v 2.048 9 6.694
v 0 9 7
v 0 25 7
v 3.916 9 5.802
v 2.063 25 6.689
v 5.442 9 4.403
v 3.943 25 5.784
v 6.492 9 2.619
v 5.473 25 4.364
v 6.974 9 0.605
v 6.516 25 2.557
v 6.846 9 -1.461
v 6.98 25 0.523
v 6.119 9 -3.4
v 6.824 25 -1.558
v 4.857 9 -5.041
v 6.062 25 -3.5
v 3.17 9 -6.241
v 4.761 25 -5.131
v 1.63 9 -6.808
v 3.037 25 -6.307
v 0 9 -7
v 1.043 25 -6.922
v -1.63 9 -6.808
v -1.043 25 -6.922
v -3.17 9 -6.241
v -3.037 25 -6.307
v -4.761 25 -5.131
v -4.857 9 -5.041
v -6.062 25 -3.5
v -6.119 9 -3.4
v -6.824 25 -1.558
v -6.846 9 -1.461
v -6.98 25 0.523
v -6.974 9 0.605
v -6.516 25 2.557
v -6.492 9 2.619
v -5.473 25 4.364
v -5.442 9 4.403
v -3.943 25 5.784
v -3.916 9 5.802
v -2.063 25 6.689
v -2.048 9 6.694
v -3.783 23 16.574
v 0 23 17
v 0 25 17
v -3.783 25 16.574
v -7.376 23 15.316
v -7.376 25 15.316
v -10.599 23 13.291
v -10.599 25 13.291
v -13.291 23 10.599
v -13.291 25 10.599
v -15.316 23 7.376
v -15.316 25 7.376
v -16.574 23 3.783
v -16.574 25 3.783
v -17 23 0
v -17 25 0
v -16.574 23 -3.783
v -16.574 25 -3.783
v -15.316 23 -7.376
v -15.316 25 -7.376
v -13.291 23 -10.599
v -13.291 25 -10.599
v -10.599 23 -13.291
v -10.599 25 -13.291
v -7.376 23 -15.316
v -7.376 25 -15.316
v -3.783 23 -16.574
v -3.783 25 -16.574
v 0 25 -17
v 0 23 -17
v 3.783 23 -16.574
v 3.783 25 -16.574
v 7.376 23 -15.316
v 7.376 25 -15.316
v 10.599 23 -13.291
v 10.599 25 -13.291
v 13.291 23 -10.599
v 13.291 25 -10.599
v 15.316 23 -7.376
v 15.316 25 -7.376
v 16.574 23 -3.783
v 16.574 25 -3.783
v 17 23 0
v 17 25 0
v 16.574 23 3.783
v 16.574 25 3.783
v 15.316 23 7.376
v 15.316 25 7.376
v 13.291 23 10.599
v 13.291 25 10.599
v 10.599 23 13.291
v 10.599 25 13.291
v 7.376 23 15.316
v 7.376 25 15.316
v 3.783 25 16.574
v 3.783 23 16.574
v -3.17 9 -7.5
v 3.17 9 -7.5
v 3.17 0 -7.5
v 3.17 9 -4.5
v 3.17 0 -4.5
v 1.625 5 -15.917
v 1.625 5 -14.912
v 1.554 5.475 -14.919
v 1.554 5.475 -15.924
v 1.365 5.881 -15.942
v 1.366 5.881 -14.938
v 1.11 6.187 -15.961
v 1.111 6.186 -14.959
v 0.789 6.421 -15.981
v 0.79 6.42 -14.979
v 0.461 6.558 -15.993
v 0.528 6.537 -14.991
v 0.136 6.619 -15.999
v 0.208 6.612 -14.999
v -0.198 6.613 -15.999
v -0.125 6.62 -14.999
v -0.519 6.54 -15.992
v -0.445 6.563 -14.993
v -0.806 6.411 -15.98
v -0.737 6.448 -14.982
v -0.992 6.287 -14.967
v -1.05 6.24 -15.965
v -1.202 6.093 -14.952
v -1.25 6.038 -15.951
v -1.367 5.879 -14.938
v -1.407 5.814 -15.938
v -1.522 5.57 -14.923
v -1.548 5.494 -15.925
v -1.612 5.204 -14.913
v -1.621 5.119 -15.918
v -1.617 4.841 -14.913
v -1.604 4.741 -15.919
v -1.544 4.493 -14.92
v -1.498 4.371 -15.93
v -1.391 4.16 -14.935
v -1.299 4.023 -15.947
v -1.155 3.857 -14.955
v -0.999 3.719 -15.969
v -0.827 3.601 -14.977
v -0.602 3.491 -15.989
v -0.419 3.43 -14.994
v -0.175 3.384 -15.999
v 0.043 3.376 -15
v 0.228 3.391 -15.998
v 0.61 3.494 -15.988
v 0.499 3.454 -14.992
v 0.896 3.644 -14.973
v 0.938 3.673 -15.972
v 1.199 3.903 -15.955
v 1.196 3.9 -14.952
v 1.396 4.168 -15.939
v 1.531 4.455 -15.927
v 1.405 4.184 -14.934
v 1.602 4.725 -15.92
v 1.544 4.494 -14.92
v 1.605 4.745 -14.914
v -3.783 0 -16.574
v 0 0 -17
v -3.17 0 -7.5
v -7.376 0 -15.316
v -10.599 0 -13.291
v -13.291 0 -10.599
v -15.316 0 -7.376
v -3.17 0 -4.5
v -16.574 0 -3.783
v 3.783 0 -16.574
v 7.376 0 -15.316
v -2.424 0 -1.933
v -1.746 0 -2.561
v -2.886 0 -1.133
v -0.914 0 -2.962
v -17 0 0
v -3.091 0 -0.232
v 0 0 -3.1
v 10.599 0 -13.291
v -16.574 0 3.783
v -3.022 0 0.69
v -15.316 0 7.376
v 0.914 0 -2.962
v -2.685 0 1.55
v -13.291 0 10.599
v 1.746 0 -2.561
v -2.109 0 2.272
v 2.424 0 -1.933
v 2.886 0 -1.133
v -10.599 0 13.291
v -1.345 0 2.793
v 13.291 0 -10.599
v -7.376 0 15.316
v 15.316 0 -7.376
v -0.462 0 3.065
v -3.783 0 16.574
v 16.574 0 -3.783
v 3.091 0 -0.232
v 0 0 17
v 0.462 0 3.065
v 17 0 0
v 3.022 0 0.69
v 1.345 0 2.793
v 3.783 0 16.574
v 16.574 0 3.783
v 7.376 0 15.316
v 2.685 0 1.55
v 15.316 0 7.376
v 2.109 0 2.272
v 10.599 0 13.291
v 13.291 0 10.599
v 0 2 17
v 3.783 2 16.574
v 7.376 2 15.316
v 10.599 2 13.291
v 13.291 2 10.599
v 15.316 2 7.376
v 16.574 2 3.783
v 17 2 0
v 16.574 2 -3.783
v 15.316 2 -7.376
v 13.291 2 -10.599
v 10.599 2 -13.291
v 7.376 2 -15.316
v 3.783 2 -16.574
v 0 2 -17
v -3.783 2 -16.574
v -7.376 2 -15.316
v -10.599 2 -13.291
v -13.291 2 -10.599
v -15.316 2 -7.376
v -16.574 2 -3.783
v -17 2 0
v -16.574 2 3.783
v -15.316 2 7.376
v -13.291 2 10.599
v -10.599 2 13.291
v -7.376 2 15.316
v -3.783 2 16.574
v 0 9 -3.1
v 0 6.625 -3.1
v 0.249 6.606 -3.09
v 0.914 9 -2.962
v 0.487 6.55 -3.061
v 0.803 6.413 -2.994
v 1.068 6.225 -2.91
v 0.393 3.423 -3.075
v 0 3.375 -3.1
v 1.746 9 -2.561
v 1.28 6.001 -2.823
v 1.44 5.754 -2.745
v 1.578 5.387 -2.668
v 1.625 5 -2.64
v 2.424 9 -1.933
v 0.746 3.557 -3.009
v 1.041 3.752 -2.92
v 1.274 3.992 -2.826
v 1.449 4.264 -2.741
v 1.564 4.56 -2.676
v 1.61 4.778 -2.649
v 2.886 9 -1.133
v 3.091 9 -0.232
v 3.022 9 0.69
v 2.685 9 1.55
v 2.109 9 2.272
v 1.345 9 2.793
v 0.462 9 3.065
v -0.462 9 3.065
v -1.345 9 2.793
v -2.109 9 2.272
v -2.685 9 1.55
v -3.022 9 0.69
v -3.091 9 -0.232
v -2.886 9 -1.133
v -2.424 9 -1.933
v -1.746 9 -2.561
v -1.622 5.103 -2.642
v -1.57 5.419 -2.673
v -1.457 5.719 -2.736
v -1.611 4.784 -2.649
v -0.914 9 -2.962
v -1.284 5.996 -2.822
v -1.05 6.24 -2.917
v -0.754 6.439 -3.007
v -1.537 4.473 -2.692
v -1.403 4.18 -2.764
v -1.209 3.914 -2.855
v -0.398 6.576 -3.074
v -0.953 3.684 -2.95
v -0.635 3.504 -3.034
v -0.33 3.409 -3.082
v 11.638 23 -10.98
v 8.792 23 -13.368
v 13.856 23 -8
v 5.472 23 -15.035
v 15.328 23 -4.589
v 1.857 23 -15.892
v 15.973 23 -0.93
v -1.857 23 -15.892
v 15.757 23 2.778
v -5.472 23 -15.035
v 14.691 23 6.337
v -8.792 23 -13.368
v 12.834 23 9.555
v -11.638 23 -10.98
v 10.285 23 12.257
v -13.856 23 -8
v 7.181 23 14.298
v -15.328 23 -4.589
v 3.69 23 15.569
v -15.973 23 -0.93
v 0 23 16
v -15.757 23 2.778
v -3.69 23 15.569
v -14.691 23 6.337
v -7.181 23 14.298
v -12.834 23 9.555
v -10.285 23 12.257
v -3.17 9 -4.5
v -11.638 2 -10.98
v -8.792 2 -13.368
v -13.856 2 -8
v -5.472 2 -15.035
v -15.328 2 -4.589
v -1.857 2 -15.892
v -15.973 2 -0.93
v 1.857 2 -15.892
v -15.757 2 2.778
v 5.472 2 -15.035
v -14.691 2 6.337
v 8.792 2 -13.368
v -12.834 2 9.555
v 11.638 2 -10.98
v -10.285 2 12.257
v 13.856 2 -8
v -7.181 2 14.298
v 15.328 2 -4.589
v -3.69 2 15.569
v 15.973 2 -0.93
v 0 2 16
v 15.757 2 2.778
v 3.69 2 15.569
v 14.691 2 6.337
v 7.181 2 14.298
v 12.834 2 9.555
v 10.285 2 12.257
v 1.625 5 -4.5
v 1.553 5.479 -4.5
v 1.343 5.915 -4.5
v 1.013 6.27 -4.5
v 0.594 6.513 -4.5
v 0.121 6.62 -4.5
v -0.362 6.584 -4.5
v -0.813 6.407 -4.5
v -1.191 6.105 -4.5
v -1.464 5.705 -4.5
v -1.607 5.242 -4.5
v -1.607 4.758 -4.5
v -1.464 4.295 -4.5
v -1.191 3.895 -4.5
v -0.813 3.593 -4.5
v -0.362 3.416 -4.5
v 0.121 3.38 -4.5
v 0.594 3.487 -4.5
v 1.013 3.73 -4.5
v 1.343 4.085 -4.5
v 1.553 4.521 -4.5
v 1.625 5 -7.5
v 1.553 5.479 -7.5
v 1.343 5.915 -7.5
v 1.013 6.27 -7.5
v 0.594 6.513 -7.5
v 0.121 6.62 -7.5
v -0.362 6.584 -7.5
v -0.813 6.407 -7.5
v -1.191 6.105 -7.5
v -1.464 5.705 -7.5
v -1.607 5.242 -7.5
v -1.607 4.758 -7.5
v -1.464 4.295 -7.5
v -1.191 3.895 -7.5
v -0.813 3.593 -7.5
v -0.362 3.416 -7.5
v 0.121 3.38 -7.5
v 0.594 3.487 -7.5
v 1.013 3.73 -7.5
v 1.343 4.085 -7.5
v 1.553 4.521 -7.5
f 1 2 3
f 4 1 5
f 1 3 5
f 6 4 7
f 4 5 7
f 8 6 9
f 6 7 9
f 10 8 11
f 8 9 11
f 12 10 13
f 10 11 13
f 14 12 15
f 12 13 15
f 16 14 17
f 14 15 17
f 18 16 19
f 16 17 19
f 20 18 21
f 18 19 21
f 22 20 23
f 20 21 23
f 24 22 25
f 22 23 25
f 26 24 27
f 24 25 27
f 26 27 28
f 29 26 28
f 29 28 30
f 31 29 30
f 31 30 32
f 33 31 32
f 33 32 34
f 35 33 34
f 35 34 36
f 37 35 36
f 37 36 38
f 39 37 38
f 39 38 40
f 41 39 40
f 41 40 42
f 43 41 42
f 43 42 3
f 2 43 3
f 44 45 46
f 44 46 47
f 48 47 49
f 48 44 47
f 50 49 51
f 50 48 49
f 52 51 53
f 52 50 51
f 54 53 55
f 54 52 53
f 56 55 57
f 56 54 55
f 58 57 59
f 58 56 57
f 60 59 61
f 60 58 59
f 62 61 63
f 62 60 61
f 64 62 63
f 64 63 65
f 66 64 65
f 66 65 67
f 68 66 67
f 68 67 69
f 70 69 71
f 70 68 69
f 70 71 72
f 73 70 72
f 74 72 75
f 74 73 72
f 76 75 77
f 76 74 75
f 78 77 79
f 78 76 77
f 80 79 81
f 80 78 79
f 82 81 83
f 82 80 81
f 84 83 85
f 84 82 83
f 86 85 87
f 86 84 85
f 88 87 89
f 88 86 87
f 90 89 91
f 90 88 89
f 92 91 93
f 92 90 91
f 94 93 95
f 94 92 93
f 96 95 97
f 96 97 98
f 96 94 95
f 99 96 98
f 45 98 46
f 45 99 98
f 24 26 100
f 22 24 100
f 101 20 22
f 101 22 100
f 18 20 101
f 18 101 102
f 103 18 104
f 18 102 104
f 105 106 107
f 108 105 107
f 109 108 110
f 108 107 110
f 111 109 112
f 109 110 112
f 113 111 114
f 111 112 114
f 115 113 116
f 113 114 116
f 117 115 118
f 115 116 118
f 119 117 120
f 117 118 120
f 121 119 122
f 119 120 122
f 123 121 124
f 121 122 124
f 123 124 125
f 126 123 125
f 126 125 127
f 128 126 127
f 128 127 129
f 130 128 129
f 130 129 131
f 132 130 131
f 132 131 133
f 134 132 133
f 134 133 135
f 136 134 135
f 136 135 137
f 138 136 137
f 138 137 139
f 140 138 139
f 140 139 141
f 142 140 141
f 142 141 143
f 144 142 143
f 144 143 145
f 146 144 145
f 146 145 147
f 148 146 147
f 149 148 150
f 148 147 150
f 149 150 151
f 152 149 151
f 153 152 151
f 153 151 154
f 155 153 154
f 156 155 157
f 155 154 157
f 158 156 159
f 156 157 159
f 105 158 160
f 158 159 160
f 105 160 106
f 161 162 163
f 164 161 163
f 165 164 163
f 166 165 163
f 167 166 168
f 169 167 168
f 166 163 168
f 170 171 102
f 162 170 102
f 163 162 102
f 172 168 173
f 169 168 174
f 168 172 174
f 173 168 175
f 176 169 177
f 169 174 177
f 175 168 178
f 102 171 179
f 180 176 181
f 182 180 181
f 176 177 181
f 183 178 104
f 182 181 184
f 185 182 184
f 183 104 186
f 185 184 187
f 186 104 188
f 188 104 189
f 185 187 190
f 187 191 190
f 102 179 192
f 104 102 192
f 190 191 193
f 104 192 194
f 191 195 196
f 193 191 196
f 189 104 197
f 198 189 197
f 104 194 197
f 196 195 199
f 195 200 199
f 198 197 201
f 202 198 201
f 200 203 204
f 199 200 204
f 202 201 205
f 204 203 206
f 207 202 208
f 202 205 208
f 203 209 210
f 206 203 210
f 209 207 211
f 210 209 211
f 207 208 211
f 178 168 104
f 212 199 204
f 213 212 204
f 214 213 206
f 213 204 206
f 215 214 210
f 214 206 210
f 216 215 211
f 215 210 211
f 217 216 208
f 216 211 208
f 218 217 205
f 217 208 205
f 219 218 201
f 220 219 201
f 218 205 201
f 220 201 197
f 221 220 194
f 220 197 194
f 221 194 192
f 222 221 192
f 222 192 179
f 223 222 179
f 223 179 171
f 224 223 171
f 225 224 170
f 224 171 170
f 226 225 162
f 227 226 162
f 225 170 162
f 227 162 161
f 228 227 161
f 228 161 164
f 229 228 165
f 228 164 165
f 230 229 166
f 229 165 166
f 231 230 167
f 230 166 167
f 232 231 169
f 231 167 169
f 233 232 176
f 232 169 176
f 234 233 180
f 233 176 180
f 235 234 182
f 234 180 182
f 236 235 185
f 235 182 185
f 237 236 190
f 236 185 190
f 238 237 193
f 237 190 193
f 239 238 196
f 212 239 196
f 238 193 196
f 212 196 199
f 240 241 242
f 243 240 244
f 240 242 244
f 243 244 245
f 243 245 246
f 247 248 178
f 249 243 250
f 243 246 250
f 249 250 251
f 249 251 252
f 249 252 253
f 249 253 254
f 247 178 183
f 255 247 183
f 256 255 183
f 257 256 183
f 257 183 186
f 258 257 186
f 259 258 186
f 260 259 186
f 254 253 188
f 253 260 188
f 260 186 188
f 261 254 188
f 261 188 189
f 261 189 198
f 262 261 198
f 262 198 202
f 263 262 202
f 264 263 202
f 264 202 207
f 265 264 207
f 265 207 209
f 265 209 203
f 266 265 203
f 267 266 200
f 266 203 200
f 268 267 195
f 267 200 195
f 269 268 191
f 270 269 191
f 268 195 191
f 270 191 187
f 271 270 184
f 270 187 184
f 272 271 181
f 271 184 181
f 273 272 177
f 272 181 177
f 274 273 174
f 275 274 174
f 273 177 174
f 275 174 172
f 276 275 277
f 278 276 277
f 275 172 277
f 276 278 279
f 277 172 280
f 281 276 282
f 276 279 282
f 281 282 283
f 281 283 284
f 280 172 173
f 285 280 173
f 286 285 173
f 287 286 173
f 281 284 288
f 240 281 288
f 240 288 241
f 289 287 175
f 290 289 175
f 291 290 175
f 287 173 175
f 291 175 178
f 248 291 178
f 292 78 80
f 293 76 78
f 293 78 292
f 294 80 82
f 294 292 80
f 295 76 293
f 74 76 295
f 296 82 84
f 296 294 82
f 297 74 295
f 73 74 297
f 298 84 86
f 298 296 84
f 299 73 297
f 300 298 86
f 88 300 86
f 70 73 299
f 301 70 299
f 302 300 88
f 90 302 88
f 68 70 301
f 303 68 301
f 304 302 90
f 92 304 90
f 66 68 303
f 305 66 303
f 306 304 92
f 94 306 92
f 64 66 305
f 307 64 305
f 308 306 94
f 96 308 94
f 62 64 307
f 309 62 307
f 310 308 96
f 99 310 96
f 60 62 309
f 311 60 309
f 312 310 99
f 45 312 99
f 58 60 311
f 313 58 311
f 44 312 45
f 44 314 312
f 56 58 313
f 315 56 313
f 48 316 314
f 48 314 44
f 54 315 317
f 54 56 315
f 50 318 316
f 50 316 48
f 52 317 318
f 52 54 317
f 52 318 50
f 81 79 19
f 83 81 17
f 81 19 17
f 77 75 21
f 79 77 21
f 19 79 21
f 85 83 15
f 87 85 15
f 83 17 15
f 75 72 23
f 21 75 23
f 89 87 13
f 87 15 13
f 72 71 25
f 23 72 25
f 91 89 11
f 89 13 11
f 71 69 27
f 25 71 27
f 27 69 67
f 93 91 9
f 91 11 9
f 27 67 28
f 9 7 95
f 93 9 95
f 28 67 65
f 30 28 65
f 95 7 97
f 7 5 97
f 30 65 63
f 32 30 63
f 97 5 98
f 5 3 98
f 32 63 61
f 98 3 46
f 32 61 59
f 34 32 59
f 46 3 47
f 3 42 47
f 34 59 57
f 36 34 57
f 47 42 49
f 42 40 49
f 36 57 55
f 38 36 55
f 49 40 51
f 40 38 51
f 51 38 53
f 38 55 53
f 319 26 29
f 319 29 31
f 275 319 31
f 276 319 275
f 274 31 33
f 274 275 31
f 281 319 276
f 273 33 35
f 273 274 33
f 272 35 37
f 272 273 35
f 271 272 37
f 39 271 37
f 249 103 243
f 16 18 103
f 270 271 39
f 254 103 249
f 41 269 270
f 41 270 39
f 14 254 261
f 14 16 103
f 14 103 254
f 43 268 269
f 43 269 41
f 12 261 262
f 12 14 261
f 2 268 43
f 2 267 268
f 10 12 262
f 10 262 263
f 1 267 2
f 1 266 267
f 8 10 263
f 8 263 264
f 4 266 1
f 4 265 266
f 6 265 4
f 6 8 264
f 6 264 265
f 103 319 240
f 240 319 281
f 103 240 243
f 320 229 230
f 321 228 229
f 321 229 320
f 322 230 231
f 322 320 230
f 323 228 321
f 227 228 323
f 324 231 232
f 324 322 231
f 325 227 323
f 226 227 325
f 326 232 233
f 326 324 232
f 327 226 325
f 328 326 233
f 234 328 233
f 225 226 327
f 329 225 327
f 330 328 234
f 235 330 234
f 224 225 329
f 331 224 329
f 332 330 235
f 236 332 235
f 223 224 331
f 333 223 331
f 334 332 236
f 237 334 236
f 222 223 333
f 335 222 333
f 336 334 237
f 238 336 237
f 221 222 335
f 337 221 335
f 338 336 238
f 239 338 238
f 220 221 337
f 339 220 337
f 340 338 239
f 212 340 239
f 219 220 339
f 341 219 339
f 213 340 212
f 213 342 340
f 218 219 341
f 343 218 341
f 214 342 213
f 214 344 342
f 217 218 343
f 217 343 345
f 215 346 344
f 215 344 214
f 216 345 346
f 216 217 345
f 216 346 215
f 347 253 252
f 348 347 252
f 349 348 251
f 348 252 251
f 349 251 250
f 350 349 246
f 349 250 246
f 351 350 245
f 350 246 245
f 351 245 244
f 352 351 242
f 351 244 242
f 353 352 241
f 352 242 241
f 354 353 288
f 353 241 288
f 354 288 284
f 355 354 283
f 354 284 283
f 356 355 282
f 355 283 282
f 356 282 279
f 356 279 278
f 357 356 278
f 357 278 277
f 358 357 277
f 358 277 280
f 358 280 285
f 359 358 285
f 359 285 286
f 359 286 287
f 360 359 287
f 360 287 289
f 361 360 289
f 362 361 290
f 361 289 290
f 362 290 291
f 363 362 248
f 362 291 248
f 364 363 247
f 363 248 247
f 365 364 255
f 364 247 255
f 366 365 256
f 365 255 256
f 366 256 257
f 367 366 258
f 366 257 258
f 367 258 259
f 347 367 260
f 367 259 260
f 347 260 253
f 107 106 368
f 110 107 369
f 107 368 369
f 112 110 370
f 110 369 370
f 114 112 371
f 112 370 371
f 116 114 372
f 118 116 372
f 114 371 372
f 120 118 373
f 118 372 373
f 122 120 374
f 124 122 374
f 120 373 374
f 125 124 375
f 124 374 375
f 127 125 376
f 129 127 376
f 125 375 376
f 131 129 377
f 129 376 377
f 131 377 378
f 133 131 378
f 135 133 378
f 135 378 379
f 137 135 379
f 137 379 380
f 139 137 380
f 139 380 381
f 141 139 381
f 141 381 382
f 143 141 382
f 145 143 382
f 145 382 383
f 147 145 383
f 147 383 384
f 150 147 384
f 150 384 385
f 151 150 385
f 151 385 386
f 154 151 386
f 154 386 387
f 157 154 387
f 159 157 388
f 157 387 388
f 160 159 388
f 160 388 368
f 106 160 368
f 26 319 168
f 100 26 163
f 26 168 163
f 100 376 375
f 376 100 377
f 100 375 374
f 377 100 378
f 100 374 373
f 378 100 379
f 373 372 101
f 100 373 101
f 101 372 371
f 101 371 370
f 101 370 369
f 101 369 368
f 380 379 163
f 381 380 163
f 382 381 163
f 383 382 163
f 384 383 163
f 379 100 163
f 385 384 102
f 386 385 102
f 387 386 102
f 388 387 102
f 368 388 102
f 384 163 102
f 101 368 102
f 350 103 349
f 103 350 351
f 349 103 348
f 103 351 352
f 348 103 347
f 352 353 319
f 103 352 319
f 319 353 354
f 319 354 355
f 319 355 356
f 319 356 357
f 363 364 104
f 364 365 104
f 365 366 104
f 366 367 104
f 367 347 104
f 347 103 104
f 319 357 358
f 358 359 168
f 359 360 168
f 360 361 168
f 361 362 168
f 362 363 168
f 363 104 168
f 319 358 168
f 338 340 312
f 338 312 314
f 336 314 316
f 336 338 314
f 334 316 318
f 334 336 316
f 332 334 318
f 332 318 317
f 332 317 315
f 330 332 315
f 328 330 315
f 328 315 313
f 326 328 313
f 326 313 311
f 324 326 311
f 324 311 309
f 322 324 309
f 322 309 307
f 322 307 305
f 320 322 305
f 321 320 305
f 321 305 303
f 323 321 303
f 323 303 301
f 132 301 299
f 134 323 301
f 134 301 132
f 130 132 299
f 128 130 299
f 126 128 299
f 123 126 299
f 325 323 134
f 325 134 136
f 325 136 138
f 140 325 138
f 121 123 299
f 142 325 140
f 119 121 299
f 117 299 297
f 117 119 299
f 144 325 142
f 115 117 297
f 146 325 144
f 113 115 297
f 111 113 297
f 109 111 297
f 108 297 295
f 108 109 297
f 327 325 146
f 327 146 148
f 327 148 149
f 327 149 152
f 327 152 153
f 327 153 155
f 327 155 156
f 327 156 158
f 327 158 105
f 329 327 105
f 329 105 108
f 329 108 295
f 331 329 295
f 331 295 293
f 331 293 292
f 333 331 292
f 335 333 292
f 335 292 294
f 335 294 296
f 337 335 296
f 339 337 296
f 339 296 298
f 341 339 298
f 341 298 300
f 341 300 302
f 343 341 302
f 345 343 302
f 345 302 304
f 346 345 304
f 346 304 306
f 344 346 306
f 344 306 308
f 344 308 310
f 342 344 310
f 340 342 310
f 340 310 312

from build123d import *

# Parameters (mm, degrees)
CROQUIS1_R                 = 15
CROQUIS1_R_2               = 3
SALIENTE_EXTRUIR1_DEPTH    = 25
CROQUIS2_R                 = 16.5
CROQUIS2_R_2               = 3
SALIENTE_EXTRUIR2_DEPTH    = 2
SALIENTE_EXTRUIR3_START    = -2
CROQUIS3_R                 = 16.5
CROQUIS3_R_2               = 3
SALIENTE_EXTRUIR3_DEPTH    = 2
CORTAR_EXTRUIR1_REACH      = 36.198
CORTAR_EXTRUIR1_END_RADIUS = 15
CROQUIS4_R                 = 1.625
CROQUIS5_R                 = 7
CORTAR_EXTRUIR2_DEPTH      = 16
CORTAR_EXTRUIR3_DEPTH      = 9
SALIENTE_EXTRUIR5_START    = 21
CROQUIS10_R                = 16
CROQUIS10_R_2              = 15
SALIENTE_EXTRUIR5_DEPTH    = 21
SALIENTE_EXTRUIR6_START    = -2
CROQUIS12_R                = 17
CROQUIS12_R_2              = 16
SALIENTE_EXTRUIR6_DEPTH    = 2
CROQUIS13_R                = 17
CROQUIS13_R_2              = 16
SALIENTE_EXTRUIR7_DEPTH    = 2
CROQUIS14_R                = 3.1
CORTAR_EXTRUIR4_DEPTH      = 10
CROQUIS15_R                = 1.625
CORTAR_EXTRUIR5_DEPTH      = 9


with BuildPart() as part:
    # Croquis1 → Saliente-Extruir1 (new body)
    with BuildSketch(Plane(origin=(0, 0, 0), x_dir=(1, 0, 0), z_dir=(0, 1, 0))):
        with Locations(Location((0, 0, 0), (0, 0, 270))):
            Circle(CROQUIS1_R)
        with Locations(Location((0, 0, 0), (0, 0, 270))):
            Circle(CROQUIS1_R_2, mode=Mode.SUBTRACT)
    extrude(amount=SALIENTE_EXTRUIR1_DEPTH)

    # Croquis2 → Saliente-Extruir2 (add)
    with BuildSketch(Plane.XZ):
        with Locations(Location((0, 0, 0), (0, 0, 270))):
            Circle(CROQUIS2_R)
        with Locations(Location((0, 0, 0), (0, 0, 90))):
            Circle(CROQUIS2_R_2, mode=Mode.SUBTRACT)
    extrude(amount=-SALIENTE_EXTRUIR2_DEPTH)

    # Croquis3 → Saliente-Extruir3 (add)
    with BuildSketch(Plane(origin=(0, 25, 0), x_dir=(1, 0, 0), z_dir=(0, 1, 0)).offset(SALIENTE_EXTRUIR3_START)):
        with Locations(Location((0, 0, 0), (0, 0, 90))):
            Circle(CROQUIS3_R)
        with Locations(Location((0, 0, 0), (0, 0, 270))):
            Circle(CROQUIS3_R_2, mode=Mode.SUBTRACT)
    extrude(amount=SALIENTE_EXTRUIR3_DEPTH)

    # Cortar-Extruir1: up to this cylinder (the profile starts inside it)
    cortar_extruir1_end = Plane(origin=(0, 5, 0), z_dir=(0, -1, 0)) * Cylinder(CORTAR_EXTRUIR1_END_RADIUS, 103.396, mode=Mode.PRIVATE)
    # Croquis4 → Cortar-Extruir1 (cut, up to the surface)
    with BuildSketch(Plane.XY, mode=Mode.PRIVATE) as cortar_extruir1_sk1:
        with Locations((0, 5)):
            Circle(CROQUIS4_R)
    cortar_extruir1_tool1 = extrude(cortar_extruir1_sk1.sketch, amount=-CORTAR_EXTRUIR1_REACH, mode=Mode.PRIVATE) & cortar_extruir1_end
    add(cortar_extruir1_tool1.solids().sort_by_distance((0, 5, 0))[0], mode=Mode.SUBTRACT)

    # Croquis5 → Cortar-Extruir2 (cut)
    with BuildSketch(Plane(origin=(0, 25, 0), x_dir=(1, 0, 0), z_dir=(0, 1, 0))):
        with Locations(Location((0, 0, 0), (0, 0, 270))):
            Circle(CROQUIS5_R)
    extrude(amount=-CORTAR_EXTRUIR2_DEPTH, mode=Mode.SUBTRACT)

    # Croquis7 → Cortar-Extruir3 (cut)
    with BuildSketch(Plane.XZ):
        Polygon((-3.17, -7.5), (3.17, -7.5), (3.17, -4.5), (0, -4.5), (-3.17, -4.5), align=None)
    extrude(amount=-CORTAR_EXTRUIR3_DEPTH, mode=Mode.SUBTRACT)

    # Croquis10 → Saliente-Extruir5 (add)
    with BuildSketch(Plane.XZ.offset(-23).offset(SALIENTE_EXTRUIR5_START)):
        with Locations(Location((0, 0, 0), (0, 0, 90))):
            Circle(CROQUIS10_R)
        Circle(CROQUIS10_R_2, mode=Mode.SUBTRACT)
    extrude(amount=-SALIENTE_EXTRUIR5_DEPTH)

    # Croquis12 → Saliente-Extruir6 (add)
    with BuildSketch(Plane(origin=(0, 2, 0), x_dir=(1, 0, 0), z_dir=(0, 1, 0)).offset(SALIENTE_EXTRUIR6_START)):
        with Locations(Location((0, 0, 0), (0, 0, 270))):
            Circle(CROQUIS12_R)
        with Locations(Location((0, 0, 0), (0, 0, 270))):
            Circle(CROQUIS12_R_2, mode=Mode.SUBTRACT)
    extrude(amount=SALIENTE_EXTRUIR6_DEPTH)

    # Croquis13 → Saliente-Extruir7 (add)
    with BuildSketch(Plane.XZ.offset(-23)):
        with Locations(Location((0, 0, 0), (0, 0, 90))):
            Circle(CROQUIS13_R)
        with Locations(Location((0, 0, 0), (0, 0, 90))):
            Circle(CROQUIS13_R_2, mode=Mode.SUBTRACT)
    extrude(amount=-SALIENTE_EXTRUIR7_DEPTH)

    # Croquis14 → Cortar-Extruir4 (cut)
    with BuildSketch(Plane.XZ):
        with Locations(Location((0, 0, 0), (0, 0, 270))):
            Circle(CROQUIS14_R)
    extrude(amount=-CORTAR_EXTRUIR4_DEPTH, mode=Mode.SUBTRACT)

    # Croquis15 → Cortar-Extruir5 (cut)
    with BuildSketch(Plane.XY.offset(-7.5)):
        with Locations((0, 5)):
            Circle(CROQUIS15_R)
    extrude(amount=-CORTAR_EXTRUIR5_DEPTH, mode=Mode.SUBTRACT)


solid = part.part
